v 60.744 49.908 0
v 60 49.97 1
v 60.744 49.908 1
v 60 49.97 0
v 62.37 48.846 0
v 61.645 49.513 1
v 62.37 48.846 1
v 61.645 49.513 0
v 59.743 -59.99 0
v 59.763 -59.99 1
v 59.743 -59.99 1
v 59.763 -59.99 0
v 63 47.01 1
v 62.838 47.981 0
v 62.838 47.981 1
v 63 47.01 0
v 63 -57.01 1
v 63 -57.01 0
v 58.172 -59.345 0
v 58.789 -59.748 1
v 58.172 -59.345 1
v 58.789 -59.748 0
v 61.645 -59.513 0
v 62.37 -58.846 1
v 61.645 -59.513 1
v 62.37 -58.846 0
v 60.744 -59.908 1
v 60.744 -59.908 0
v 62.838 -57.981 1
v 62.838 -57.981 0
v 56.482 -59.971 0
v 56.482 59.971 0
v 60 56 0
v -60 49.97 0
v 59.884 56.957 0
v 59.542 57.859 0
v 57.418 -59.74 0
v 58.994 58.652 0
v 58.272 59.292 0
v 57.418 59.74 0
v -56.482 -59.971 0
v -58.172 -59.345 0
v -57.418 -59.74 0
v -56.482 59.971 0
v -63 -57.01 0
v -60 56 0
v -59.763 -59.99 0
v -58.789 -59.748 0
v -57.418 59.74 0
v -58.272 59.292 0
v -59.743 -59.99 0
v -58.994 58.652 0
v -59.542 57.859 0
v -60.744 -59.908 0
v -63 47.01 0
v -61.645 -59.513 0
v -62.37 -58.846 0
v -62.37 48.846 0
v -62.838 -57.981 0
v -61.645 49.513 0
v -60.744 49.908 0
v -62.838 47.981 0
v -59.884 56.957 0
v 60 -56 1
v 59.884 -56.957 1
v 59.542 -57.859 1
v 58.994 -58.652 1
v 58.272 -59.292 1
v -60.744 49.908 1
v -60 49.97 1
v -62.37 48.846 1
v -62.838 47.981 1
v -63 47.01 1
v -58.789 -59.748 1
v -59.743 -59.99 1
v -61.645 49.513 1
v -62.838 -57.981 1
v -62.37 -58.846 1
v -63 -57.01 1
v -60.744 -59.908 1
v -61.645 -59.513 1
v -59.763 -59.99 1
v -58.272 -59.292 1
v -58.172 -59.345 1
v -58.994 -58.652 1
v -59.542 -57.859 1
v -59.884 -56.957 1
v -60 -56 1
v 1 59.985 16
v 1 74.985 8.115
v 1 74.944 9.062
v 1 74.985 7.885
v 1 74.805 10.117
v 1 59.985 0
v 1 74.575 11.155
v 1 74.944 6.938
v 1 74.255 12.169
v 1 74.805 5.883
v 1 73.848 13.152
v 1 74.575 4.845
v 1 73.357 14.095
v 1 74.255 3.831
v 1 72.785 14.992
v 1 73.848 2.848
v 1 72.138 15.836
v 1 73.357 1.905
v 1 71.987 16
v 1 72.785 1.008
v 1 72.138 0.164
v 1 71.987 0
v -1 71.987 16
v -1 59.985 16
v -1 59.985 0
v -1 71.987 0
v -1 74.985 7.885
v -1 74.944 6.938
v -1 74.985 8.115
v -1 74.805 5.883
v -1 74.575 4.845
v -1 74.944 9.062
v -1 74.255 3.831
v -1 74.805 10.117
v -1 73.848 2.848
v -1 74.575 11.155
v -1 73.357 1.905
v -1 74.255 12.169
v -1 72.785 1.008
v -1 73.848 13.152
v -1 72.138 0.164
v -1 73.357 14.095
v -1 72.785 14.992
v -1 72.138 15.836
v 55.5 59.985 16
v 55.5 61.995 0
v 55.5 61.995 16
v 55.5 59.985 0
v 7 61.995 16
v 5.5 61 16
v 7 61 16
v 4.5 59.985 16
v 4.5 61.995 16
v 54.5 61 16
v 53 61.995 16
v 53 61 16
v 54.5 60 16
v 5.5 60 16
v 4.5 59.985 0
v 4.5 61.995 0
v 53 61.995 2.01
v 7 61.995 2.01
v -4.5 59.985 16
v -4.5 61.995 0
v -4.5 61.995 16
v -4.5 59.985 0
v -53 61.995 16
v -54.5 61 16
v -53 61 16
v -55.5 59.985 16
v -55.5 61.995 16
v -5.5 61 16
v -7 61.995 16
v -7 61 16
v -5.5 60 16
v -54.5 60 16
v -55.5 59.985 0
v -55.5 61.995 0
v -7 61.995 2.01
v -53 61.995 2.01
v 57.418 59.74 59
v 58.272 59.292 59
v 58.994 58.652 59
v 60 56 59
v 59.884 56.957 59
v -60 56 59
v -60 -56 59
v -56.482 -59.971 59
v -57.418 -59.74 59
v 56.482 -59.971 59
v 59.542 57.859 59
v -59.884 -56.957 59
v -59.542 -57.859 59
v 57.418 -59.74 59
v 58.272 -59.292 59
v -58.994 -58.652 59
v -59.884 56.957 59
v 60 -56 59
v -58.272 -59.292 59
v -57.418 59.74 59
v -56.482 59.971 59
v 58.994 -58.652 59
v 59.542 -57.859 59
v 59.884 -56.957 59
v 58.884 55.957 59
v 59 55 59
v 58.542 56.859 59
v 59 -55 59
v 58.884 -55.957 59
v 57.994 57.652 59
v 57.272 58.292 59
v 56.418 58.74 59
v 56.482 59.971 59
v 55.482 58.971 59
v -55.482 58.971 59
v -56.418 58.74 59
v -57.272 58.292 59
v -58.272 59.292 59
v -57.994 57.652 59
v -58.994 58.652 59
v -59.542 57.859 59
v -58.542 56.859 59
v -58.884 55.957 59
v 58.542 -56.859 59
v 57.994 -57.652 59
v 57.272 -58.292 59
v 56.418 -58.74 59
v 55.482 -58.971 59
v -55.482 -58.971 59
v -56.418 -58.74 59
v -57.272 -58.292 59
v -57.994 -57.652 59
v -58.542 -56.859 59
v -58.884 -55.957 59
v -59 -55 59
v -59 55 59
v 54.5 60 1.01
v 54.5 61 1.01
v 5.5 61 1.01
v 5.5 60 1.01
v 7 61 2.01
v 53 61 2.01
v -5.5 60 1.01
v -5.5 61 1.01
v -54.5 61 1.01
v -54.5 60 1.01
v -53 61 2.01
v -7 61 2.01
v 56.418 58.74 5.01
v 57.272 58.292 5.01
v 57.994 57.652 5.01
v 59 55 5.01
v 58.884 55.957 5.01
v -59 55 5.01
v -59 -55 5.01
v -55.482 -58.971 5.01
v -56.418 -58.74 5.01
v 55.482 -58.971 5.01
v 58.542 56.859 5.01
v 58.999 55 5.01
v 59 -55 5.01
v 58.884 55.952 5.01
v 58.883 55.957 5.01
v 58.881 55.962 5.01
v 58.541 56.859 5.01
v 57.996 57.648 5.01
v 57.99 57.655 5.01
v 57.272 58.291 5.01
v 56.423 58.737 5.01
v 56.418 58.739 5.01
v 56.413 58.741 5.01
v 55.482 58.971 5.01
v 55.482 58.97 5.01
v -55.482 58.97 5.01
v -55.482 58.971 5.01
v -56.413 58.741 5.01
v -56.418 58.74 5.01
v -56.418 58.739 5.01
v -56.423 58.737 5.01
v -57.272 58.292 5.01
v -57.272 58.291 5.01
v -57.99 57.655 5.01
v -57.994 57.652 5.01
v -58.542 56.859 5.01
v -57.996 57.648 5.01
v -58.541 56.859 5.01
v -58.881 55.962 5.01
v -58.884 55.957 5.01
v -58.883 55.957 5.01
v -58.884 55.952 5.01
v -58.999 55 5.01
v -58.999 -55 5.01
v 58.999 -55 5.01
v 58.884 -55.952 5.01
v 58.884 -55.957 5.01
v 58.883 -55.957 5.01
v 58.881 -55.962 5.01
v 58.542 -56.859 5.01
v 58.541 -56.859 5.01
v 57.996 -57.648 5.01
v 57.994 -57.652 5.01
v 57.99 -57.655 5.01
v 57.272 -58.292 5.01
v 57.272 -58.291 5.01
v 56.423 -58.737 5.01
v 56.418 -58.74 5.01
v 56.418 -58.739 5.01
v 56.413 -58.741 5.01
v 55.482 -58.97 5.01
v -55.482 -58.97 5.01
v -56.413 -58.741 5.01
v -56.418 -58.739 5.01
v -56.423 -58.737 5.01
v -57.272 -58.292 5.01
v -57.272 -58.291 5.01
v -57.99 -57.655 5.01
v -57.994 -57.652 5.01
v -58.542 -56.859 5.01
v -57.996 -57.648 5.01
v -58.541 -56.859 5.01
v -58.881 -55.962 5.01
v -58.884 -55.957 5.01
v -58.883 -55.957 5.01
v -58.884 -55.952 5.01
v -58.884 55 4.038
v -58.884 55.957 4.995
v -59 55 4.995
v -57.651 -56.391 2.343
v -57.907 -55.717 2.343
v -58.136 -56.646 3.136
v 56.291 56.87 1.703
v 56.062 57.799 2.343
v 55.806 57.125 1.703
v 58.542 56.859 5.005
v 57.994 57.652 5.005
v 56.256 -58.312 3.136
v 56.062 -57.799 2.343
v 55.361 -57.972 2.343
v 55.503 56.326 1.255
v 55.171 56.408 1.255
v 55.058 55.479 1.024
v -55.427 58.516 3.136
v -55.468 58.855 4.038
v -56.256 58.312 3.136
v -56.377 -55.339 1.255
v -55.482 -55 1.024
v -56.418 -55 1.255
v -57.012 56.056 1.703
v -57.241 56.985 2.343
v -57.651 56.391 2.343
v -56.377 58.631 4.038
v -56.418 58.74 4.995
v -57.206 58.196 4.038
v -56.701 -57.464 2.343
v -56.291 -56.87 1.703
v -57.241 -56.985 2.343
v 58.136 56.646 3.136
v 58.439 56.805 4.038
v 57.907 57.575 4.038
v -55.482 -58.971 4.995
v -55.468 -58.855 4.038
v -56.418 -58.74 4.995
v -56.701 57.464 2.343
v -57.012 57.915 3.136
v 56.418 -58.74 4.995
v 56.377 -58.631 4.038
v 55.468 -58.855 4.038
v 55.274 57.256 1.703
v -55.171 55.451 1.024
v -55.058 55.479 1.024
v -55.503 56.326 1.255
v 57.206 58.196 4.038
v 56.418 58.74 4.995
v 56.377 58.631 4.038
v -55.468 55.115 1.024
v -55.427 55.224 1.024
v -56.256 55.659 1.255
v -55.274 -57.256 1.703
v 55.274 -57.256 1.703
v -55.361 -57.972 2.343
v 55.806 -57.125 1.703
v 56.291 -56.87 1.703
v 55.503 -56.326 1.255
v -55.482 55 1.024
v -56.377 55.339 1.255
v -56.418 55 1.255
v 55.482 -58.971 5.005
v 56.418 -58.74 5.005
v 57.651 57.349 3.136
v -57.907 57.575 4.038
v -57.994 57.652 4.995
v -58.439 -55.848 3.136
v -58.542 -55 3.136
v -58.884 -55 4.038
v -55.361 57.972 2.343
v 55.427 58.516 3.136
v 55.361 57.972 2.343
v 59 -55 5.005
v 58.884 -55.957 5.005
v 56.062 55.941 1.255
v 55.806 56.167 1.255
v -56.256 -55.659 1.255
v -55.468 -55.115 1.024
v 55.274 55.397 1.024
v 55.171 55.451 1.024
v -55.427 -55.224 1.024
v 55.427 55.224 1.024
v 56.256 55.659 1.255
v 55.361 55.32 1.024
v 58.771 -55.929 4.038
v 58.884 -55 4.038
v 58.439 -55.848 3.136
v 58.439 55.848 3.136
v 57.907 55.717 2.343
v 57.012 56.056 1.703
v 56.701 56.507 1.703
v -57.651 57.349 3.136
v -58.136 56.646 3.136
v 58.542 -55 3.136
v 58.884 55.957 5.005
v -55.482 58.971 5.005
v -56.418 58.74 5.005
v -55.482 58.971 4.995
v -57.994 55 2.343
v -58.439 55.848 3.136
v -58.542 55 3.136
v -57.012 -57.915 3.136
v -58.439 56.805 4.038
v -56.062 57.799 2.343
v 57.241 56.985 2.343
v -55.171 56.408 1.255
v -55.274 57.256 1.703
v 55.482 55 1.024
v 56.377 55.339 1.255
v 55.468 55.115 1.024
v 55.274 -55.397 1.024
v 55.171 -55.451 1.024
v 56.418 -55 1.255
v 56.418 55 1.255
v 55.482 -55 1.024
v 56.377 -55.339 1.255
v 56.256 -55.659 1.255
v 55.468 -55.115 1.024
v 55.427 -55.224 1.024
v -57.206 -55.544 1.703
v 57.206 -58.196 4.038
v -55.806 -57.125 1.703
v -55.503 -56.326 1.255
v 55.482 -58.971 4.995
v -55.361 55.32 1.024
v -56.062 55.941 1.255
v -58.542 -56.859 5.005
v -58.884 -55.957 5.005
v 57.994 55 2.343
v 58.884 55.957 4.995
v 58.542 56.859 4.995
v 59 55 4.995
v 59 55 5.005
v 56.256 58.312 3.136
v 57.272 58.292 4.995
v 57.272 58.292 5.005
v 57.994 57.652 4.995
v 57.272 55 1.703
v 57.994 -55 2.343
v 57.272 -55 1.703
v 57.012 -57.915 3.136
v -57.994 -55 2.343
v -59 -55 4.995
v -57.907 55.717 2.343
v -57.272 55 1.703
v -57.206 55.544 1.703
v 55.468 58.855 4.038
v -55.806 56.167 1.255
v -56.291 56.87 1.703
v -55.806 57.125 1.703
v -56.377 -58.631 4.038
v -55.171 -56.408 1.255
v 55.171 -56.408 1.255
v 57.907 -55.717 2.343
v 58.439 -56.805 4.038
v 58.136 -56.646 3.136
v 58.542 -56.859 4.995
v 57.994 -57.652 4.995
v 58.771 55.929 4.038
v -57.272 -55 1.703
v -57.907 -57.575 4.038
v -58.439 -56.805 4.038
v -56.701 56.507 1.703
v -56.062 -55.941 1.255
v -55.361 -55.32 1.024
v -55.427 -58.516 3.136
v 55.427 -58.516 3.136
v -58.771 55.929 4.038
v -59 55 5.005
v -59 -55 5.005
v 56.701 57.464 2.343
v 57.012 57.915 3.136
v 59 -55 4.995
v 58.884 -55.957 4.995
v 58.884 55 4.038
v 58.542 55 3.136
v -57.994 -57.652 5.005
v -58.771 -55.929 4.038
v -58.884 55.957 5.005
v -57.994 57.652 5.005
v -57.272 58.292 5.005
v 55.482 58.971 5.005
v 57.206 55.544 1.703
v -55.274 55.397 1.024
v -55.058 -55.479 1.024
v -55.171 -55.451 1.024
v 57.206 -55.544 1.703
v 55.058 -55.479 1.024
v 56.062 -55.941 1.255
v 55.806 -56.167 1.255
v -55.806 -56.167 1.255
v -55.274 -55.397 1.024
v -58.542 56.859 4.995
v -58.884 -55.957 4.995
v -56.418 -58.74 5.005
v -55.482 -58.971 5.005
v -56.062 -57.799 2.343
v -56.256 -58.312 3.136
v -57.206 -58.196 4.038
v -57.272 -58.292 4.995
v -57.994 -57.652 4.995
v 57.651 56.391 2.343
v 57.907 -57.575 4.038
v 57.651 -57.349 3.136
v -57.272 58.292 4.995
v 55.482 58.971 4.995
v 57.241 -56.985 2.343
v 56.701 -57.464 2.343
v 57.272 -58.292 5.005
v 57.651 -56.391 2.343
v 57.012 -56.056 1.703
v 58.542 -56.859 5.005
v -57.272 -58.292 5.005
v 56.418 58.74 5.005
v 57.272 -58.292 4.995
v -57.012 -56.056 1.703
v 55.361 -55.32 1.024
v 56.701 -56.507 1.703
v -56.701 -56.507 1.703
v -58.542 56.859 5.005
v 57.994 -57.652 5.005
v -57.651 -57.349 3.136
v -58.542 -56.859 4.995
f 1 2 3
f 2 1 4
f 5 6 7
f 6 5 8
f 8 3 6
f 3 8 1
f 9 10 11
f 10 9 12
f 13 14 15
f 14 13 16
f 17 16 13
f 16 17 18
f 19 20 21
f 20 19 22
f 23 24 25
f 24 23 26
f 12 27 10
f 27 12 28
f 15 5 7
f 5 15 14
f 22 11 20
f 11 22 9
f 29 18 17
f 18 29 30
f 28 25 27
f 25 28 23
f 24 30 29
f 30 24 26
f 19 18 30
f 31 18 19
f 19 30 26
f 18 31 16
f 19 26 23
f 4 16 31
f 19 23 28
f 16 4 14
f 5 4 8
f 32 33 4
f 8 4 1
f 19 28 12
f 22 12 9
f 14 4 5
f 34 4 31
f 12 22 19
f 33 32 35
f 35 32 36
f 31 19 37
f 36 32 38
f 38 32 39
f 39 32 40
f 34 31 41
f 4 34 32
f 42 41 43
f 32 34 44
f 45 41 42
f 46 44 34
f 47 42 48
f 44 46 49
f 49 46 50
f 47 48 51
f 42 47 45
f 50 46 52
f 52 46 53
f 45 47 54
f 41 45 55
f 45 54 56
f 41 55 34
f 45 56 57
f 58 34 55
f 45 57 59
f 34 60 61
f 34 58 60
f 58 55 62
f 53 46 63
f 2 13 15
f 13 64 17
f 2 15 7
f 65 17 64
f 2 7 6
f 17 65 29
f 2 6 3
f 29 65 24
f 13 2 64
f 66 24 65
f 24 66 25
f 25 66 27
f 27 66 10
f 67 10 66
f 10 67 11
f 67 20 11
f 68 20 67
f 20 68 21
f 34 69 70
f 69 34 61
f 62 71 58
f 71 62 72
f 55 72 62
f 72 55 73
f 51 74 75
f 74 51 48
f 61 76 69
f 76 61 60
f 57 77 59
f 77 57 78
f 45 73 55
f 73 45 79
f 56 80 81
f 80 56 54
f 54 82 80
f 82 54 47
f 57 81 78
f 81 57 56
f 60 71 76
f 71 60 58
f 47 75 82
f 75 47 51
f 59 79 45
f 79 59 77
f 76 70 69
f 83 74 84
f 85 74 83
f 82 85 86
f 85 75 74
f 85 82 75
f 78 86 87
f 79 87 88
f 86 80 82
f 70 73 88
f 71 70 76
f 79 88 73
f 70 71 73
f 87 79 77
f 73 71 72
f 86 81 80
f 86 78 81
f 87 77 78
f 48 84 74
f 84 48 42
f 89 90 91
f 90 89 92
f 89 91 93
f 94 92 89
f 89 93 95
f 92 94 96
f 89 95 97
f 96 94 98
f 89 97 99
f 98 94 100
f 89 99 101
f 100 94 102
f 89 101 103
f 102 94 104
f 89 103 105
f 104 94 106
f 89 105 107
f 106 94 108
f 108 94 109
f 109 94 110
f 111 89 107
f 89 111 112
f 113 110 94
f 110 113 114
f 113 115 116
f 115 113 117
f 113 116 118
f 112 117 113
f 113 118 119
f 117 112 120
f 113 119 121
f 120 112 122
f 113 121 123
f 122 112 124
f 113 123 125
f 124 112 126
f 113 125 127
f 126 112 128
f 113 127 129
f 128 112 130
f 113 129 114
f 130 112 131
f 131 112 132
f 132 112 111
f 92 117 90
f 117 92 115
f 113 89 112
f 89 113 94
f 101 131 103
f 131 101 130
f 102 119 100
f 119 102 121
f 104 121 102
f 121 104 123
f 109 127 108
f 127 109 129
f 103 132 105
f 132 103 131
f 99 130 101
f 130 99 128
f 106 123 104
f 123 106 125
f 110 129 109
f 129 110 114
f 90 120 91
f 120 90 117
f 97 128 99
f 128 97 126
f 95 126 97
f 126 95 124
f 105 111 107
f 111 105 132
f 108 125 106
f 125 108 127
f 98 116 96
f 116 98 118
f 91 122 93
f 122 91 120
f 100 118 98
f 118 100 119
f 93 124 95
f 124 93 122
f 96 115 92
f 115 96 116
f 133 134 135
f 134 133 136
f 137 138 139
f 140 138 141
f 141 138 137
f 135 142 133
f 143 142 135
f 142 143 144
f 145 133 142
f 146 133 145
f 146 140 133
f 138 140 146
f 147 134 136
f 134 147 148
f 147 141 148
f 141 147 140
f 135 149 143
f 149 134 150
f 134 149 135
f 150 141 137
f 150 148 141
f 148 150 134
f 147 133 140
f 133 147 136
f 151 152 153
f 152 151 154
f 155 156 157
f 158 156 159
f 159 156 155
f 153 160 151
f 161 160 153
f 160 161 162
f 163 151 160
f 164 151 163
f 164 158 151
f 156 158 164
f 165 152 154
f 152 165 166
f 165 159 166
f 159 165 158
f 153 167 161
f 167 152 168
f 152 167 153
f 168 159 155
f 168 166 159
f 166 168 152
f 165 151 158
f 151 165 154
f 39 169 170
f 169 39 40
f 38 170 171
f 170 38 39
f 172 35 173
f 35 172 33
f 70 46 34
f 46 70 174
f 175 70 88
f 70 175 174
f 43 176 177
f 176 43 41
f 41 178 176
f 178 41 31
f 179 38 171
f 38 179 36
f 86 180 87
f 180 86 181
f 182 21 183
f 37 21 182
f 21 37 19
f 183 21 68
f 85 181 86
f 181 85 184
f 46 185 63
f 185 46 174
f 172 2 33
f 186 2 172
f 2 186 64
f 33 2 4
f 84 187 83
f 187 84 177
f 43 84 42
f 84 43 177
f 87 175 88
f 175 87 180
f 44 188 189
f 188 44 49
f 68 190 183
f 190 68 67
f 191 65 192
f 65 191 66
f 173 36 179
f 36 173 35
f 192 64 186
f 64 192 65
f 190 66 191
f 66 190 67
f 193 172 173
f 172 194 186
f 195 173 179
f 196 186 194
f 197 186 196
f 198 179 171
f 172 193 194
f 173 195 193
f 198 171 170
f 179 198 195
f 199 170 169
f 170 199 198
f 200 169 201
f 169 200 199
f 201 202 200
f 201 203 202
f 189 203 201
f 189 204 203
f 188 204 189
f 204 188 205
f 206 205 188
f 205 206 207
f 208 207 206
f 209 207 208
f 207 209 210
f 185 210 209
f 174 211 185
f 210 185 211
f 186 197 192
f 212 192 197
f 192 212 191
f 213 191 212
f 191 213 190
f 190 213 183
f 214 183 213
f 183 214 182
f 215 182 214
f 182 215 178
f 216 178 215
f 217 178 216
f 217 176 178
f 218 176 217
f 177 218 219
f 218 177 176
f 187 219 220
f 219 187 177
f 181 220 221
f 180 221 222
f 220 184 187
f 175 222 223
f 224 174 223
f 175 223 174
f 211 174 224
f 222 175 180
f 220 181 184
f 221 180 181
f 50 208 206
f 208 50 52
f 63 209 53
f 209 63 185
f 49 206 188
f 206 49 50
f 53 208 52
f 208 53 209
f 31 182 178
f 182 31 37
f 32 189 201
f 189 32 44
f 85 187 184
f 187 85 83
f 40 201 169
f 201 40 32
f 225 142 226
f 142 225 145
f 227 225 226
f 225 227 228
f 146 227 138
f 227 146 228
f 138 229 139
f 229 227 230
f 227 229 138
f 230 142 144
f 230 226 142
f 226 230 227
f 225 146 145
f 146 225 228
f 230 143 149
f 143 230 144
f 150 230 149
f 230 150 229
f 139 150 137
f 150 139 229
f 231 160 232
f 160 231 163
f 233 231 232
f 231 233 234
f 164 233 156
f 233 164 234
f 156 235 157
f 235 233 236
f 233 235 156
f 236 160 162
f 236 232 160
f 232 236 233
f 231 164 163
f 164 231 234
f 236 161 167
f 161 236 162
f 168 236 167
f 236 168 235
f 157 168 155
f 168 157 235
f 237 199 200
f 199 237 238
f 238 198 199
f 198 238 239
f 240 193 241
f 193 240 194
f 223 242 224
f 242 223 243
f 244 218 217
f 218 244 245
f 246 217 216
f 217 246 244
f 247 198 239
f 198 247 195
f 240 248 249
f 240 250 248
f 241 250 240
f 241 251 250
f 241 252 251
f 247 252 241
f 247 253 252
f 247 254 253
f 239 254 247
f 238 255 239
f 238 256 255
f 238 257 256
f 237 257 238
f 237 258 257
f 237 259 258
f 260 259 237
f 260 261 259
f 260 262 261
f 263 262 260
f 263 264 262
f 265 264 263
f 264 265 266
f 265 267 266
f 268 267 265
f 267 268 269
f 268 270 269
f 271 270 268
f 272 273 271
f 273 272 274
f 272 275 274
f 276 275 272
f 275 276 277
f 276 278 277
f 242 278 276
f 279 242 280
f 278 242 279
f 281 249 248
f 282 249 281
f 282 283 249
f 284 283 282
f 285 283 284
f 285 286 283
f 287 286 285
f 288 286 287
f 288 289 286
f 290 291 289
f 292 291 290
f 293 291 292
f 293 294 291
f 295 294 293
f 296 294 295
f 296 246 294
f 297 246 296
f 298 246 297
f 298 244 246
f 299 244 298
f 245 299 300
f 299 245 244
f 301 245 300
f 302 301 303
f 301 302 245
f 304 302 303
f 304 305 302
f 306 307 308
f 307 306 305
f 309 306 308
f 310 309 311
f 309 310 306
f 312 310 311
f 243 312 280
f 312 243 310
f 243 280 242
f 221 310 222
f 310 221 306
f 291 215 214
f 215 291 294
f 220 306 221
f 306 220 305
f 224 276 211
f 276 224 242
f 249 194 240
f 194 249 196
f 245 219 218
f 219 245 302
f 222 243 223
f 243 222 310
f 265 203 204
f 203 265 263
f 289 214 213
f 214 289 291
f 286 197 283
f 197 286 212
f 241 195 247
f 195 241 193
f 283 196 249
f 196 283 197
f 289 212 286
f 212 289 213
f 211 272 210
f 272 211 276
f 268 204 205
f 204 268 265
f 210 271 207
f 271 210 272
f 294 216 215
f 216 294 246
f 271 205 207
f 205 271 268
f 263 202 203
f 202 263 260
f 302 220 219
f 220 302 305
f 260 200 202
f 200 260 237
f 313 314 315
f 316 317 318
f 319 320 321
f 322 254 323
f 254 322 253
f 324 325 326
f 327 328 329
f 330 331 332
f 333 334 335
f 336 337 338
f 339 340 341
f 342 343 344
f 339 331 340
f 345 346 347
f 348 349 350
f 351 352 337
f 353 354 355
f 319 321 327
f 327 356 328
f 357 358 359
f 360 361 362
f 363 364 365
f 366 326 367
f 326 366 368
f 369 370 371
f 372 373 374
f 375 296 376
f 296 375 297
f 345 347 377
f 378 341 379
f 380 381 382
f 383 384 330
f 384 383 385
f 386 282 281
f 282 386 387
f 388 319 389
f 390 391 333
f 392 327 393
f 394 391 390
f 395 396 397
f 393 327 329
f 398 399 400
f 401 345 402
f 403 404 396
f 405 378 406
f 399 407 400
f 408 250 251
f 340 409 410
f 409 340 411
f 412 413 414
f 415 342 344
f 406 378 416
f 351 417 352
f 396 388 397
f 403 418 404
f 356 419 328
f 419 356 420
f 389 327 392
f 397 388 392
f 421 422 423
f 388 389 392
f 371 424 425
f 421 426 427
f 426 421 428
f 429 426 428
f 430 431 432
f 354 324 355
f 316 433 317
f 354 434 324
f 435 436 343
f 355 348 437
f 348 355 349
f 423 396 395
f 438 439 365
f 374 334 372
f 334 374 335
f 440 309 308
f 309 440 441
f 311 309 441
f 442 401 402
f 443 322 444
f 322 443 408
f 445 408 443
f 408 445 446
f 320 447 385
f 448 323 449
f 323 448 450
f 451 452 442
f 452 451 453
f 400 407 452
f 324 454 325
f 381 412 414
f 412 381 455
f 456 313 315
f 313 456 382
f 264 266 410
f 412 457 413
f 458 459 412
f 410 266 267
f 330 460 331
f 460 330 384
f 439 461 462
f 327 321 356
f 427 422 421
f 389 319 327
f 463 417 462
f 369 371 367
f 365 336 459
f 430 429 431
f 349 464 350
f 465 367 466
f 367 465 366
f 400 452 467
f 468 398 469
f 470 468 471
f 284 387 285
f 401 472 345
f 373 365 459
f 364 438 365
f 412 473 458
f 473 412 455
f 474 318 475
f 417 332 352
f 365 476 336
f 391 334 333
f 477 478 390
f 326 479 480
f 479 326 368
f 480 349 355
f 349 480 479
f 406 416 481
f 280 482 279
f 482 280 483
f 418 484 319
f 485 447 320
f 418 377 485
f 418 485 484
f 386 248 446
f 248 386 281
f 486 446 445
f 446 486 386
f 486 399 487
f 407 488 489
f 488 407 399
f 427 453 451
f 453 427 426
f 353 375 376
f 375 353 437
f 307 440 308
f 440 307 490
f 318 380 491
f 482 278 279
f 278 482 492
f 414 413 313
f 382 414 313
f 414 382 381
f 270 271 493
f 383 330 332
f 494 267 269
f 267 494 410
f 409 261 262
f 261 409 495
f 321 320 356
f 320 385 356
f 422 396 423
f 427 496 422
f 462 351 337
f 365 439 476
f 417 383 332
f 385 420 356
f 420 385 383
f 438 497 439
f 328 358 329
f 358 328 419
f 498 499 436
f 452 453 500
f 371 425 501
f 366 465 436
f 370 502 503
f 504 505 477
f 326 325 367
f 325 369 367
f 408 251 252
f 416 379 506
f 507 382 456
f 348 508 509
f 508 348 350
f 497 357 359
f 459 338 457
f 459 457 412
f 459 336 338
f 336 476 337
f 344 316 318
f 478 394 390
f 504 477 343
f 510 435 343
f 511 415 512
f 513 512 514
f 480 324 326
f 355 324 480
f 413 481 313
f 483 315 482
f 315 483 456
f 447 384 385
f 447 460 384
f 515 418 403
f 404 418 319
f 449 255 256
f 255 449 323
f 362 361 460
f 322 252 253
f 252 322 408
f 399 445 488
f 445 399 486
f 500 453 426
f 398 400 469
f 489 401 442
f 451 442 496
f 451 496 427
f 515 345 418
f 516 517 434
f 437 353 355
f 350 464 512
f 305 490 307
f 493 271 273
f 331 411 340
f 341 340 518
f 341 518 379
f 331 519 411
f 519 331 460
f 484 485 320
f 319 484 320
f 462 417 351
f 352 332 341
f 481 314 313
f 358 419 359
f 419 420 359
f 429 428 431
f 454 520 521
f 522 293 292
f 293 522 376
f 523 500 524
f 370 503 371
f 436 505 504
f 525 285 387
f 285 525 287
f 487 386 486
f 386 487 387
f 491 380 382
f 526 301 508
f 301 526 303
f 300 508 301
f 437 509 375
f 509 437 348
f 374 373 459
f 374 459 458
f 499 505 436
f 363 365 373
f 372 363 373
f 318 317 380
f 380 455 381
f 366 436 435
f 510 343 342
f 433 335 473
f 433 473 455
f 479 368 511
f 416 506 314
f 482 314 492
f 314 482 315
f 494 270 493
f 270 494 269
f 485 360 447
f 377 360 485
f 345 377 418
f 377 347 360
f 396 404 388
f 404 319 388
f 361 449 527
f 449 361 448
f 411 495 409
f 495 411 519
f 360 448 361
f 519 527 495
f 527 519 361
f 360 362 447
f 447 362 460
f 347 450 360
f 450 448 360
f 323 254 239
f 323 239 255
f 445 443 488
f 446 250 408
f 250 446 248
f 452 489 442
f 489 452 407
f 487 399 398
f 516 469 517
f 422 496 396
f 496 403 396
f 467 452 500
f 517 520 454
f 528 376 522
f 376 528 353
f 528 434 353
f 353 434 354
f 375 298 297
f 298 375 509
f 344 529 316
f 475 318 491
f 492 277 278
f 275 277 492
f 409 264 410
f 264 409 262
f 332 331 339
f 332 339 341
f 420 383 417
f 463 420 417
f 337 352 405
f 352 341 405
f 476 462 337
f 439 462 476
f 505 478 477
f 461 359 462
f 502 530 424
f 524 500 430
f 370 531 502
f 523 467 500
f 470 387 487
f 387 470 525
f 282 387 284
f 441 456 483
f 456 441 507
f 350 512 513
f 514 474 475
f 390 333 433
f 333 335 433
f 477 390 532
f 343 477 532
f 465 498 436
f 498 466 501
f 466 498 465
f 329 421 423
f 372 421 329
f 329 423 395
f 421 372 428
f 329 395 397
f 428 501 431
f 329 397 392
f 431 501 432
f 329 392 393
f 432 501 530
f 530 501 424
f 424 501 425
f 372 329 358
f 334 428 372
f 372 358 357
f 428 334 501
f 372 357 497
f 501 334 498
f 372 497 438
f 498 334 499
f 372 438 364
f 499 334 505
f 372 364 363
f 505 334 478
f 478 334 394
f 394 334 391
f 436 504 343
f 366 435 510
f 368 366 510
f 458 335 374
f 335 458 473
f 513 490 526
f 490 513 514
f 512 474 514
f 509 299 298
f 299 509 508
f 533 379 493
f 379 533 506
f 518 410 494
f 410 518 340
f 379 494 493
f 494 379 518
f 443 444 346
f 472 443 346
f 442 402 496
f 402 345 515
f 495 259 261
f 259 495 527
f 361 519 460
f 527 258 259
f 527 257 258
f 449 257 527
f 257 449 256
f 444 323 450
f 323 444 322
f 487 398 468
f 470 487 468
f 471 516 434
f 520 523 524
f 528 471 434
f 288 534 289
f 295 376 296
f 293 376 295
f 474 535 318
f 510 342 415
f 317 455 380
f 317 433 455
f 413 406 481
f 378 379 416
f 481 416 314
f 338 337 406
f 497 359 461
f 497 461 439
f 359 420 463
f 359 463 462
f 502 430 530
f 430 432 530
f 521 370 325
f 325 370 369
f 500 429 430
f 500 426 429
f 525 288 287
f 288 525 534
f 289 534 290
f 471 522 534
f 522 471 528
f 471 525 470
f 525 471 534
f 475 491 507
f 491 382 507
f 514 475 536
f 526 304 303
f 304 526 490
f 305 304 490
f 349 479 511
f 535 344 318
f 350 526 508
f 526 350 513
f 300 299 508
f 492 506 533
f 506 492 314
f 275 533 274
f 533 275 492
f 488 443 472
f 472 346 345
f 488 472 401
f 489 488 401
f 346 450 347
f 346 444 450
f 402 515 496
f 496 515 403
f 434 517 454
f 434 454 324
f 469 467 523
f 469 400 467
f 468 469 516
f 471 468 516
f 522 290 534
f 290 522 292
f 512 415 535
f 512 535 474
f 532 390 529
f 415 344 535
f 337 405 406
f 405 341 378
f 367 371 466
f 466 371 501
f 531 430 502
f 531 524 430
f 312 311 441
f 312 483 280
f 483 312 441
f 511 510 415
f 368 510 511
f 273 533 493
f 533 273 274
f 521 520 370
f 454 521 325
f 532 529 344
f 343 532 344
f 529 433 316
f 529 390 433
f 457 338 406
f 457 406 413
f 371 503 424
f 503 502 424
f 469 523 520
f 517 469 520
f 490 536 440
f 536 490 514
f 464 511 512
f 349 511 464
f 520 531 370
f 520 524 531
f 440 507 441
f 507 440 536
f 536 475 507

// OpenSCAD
// Customizable Ultimate Drawer System Drawer
// Remixed from MarcElbichon's Ultimate Drawer System https://www.thingiverse.com/thing:2302575 (CC-BY 4.0)
// Copyright (C) 2019 by Brian Alano (and possibly others)
// Licensed under the Creative Commons Attribution-NonCommercial-ShareAlike 4.0 (CC-BY-NC-SA 4.0)

/* Release Notes 
 * Version 1.1
 * Made label slots optional, and removed them entirely for 0.5U wide drawers.
 * Added 0.5U wide and 0.5U deep options
 */
 
/* Design notes
// width is x dimension, across the face of the drawer
// depth is y dimension, front to back of the drawer
// height is z dimension
*/

/* Coding Style Guide 
 * User parameters and modules use underscores between words.
 * Other variable names use camel case.
 * Separate features into their own modules if they are more than a couple lines long.
 * All dimensions should be assigned to variables, usually global ones so they can be found easily.
 * Keep local modules local.
 * Keep local variables local.
 * Maintain Thingiverse Customizer compatibility.
 * Maintain backwards compatibility with MarcElbichon's Ultimate Drawer System 
   (https://www.thingiverse.com/thing:2302575). This means a 1Ux1Ux1U drawer 
   made with this program will work in MarcElbichon's shelf. 
*/

/* [Size] */
// units wide (actual drawer width is 131*U_wide - 10)
U_wide=1; // [0.5, 1, 1.5]
// units deep (actual drawer depth is 130*U_deep - 10)
U_deep=1; // [0.5, 1, 1.5]
// units high (actual drawer height is 20*U_high - 1)
U_high=3; // [1:15]

/* [Features] */
// Include slots for labels? 
labels = "yes"; //[yes, no]
// What kind of drawer pull?
pull_style = "original"; // [original, ergonomic, ring]
// the flange is what keeps the drawer in the slot. "catch" leaves a bump for holding the drawer in the a shelf with snaps. 
flange_style = "normal"; // [normal, catch, none]
// include slots on the back of the drawer for the locking mechanism
rear_lock_slot = "no"; // [yes, no]

/* [Hidden] */
// utility variables
epsilon = 0.01;
$fs=1;
$fa=5;

drawerUnit=[120, 120, 19];
shelfPadding=[11, 10, 1];

wallThickness = 1;
shelfUnit = [131, 130, 30];
shelf = [shelfUnit.x * U_wide, shelfUnit.y * U_deep, (shelfUnit.z - wallThickness*2) * U_high - wallThickness*2]; // reference dimension from shelf .scad file.
echo("shelf dimensions", shelf);
drawer = [shelf.x - shelfPadding.x, shelf.y - shelfPadding.y, shelf.z - shelfPadding.z];
echo("drawer dimensions", drawer);

cornerR = 4;
cornerD = cornerR * 2;
flange = [flange_style == "catch" 
    ? 3*0.6 
    : flange_style == "none" 
        ? 0
        : 3, d_to_y(U_deep)-shelfPadding.y, 1];
flangeR = flange.x - epsilon;
flangeD = flangeR * 2;
catchFlange = 10;
pullD = 24.38;
pull = [2, pullD/2 + 2.8, 16];
label = [51, 2, 16];
labelSlot = [49, 1, 15];
labelWindow = [46, 1, 14];
catch = [3, 4, flange.z];
rearLockSlot = [26, 3.5, 8];
includeLabels = labels == "yes" && U_wide > 0.5;

// the spacing between drawings is 20, or drawerUnit.z + 1. so a 1U drawer is 19, a 2U drawer is 39, etc.
//FIXME replace with drawer[]
//FIXME put lock on bottom, not top.
function u_to_z(u) = (drawerUnit.z + shelfPadding.z) * u - shelfPadding.z;
function w_to_x(w) = (drawerUnit.x + shelfPadding.x) * w - shelfPadding.x;
function d_to_y(d) = (drawerUnit.y + shelfPadding.y) * d - shelfPadding.y;

module drawer(U_wide = U_wide, U_deep = U_deep, U_high = U_high, includeLabels = includeLabels) {
    module add() {
        // main body
        linear_extrude(u_to_z(U_high))
            roundtangle(width=w_to_x(U_wide), length=d_to_y(U_deep), radius=cornerR);
        // flanges
        reflect([1, 0, 0]) {
            linear_extrude(flange.z) 
            translate([w_to_x(U_wide)/2, -(d_to_y(U_deep) - flange.y)/2]) {
                roundtangle(flange.x*2, flange.y, flangeR);
            }
            translate([w_to_x(U_wide)/2, -(d_to_y(U_deep) - catch.y)/2, 0]) {
                linear_extrude(flange.z) roundtangle(catch.x*2, catch.y, flangeR);
            }
        }

        // pull
        translate([0, d_to_y(U_deep)/2, pull.z/2]) pull(style=pull_style);

        // label holders (positive part)
        if (includeLabels) labels("add");

        // rear lock pockets
        if (rear_lock_slot == "yes")
            for(j = [1:U_high])
                translate([0, -d_to_y(U_deep)/2, u_to_z(j)]) 
                    rearLockSlot();
    }
    
    module subtract() {
        // main cut, minus fillets
        cut = [w_to_x(U_wide) - wallThickness*2, d_to_y(U_deep) - wallThickness*2, u_to_z(U_high) - wallThickness - cornerR];
        translate([0, 0, u_to_z(U_high) - cut.z + epsilon]) 
            linear_extrude(cut.z + epsilon) roundtangle(cut.x, cut.y, cornerR);
        // fillet cut
       translate([0, 0, u_to_z(U_high) - cut.z]) 
            minkowski() {
                cube([cut.x - cornerD, cut.y - cornerD, epsilon], center=true);
                sphere(d=cornerD);
            }
        // label holders (positive part)
        if (includeLabels) labels("subtract");

    }
     
    difference() {
        add();  
        subtract();
    }
}

module labels(mode="add") {
    module add() {
        for (i = [1, -1]) {
            translate([w_to_x(U_wide)/4*i, (d_to_y(U_deep) + label.y)/2 - epsilon, label.z/2]) cube([label.x, label.y + epsilon, label.z], center=true);
        }
    }
    
    module subtract() {
        for (i=[1, -1]) {
            // label cuts
            translate([w_to_x(U_wide)/4*i, d_to_y(U_deep)/2 + labelSlot.y/2, labelSlot.z/2 + (label.z - labelSlot.z) + epsilon])
                cube(labelSlot, center=true);
            translate([w_to_x(U_wide)/4*i, d_to_y(U_deep)/2 + label.y - wallThickness/2, labelWindow.z/2 + (label.z - labelWindow.z) + epsilon])
                cube(labelWindow, center=true);
        }
    }
    
    if (mode=="add") add(); else subtract();
}


module pull(style) {
    // drawer pull
    module original() {
        intersection() {
           translate([0, pull.y/2 - epsilon]) cube([pull.x, pull.y + epsilon, pull.z], center = true);
           translate([0, pull.y - pullD/2]) rotate([0, 90, 0]) cylinder(d=pullD, h=pull.x, center = true);
        }
    }

    module ergonomic() {
        difference() {
            original();
            translate([0, pull.y - pullD/2]) rotate([0, 90, 0]) {
                intersection() {
                    cylinder(d=pullD/2, h=pull.x+epsilon*4, center = true);
                    translate([0, pullD/3]) cylinder(d=pullD/2, h=pull.x+epsilon*4, center = true);
                }
            }
        }
        scale([3, 1, 1]) difference() {
            original();
            translate([0, pull.y - pullD/2]) rotate([0, 90, 0]) cylinder(d=pullD-pull.x*2, h=pull.x+epsilon*2, center = true);
        }
    }

    if (style == "original") original();
    if (style == "ergonomic") ergonomic();
}

module rearLockSlot() {    
    module half() {
        translate([rearLockSlot.x/2, -rearLockSlot.y, -drawerUnit.z + rearLockSlot.z/2]) 
        {
            cube([wallThickness, rearLockSlot.y, rearLockSlot.z/2]);
            rotate([0, 90, 0])
                linear_extrude(wallThickness) 
                polygon([[0, 0], [rearLockSlot.y, rearLockSlot.y], [0, rearLockSlot.y]]);
        }
        translate([0, -rearLockSlot.y, -drawerUnit.z + rearLockSlot.z/2]) 
            cube([rearLockSlot.x/2, wallThickness, rearLockSlot.z/2]);
    }
    
    module add() {
        for(i=[0, 1]) 
            mirror([i, 0, 0]) half();
    }
    add();
//    half();
}


/* render both the child object and its mirror 
    usage: otherwise operates just like mirror()
*/
module reflect(v) {
    children();
    mirror(v) children();
}


module roundtangle(width, length, radius) {
    minkowski() {
                square([width - radius*2, length - radius*2], center=true);
                circle(r=radius);
            }
}

drawer();
//pull(style="ergonomic");
//rear_lock();
